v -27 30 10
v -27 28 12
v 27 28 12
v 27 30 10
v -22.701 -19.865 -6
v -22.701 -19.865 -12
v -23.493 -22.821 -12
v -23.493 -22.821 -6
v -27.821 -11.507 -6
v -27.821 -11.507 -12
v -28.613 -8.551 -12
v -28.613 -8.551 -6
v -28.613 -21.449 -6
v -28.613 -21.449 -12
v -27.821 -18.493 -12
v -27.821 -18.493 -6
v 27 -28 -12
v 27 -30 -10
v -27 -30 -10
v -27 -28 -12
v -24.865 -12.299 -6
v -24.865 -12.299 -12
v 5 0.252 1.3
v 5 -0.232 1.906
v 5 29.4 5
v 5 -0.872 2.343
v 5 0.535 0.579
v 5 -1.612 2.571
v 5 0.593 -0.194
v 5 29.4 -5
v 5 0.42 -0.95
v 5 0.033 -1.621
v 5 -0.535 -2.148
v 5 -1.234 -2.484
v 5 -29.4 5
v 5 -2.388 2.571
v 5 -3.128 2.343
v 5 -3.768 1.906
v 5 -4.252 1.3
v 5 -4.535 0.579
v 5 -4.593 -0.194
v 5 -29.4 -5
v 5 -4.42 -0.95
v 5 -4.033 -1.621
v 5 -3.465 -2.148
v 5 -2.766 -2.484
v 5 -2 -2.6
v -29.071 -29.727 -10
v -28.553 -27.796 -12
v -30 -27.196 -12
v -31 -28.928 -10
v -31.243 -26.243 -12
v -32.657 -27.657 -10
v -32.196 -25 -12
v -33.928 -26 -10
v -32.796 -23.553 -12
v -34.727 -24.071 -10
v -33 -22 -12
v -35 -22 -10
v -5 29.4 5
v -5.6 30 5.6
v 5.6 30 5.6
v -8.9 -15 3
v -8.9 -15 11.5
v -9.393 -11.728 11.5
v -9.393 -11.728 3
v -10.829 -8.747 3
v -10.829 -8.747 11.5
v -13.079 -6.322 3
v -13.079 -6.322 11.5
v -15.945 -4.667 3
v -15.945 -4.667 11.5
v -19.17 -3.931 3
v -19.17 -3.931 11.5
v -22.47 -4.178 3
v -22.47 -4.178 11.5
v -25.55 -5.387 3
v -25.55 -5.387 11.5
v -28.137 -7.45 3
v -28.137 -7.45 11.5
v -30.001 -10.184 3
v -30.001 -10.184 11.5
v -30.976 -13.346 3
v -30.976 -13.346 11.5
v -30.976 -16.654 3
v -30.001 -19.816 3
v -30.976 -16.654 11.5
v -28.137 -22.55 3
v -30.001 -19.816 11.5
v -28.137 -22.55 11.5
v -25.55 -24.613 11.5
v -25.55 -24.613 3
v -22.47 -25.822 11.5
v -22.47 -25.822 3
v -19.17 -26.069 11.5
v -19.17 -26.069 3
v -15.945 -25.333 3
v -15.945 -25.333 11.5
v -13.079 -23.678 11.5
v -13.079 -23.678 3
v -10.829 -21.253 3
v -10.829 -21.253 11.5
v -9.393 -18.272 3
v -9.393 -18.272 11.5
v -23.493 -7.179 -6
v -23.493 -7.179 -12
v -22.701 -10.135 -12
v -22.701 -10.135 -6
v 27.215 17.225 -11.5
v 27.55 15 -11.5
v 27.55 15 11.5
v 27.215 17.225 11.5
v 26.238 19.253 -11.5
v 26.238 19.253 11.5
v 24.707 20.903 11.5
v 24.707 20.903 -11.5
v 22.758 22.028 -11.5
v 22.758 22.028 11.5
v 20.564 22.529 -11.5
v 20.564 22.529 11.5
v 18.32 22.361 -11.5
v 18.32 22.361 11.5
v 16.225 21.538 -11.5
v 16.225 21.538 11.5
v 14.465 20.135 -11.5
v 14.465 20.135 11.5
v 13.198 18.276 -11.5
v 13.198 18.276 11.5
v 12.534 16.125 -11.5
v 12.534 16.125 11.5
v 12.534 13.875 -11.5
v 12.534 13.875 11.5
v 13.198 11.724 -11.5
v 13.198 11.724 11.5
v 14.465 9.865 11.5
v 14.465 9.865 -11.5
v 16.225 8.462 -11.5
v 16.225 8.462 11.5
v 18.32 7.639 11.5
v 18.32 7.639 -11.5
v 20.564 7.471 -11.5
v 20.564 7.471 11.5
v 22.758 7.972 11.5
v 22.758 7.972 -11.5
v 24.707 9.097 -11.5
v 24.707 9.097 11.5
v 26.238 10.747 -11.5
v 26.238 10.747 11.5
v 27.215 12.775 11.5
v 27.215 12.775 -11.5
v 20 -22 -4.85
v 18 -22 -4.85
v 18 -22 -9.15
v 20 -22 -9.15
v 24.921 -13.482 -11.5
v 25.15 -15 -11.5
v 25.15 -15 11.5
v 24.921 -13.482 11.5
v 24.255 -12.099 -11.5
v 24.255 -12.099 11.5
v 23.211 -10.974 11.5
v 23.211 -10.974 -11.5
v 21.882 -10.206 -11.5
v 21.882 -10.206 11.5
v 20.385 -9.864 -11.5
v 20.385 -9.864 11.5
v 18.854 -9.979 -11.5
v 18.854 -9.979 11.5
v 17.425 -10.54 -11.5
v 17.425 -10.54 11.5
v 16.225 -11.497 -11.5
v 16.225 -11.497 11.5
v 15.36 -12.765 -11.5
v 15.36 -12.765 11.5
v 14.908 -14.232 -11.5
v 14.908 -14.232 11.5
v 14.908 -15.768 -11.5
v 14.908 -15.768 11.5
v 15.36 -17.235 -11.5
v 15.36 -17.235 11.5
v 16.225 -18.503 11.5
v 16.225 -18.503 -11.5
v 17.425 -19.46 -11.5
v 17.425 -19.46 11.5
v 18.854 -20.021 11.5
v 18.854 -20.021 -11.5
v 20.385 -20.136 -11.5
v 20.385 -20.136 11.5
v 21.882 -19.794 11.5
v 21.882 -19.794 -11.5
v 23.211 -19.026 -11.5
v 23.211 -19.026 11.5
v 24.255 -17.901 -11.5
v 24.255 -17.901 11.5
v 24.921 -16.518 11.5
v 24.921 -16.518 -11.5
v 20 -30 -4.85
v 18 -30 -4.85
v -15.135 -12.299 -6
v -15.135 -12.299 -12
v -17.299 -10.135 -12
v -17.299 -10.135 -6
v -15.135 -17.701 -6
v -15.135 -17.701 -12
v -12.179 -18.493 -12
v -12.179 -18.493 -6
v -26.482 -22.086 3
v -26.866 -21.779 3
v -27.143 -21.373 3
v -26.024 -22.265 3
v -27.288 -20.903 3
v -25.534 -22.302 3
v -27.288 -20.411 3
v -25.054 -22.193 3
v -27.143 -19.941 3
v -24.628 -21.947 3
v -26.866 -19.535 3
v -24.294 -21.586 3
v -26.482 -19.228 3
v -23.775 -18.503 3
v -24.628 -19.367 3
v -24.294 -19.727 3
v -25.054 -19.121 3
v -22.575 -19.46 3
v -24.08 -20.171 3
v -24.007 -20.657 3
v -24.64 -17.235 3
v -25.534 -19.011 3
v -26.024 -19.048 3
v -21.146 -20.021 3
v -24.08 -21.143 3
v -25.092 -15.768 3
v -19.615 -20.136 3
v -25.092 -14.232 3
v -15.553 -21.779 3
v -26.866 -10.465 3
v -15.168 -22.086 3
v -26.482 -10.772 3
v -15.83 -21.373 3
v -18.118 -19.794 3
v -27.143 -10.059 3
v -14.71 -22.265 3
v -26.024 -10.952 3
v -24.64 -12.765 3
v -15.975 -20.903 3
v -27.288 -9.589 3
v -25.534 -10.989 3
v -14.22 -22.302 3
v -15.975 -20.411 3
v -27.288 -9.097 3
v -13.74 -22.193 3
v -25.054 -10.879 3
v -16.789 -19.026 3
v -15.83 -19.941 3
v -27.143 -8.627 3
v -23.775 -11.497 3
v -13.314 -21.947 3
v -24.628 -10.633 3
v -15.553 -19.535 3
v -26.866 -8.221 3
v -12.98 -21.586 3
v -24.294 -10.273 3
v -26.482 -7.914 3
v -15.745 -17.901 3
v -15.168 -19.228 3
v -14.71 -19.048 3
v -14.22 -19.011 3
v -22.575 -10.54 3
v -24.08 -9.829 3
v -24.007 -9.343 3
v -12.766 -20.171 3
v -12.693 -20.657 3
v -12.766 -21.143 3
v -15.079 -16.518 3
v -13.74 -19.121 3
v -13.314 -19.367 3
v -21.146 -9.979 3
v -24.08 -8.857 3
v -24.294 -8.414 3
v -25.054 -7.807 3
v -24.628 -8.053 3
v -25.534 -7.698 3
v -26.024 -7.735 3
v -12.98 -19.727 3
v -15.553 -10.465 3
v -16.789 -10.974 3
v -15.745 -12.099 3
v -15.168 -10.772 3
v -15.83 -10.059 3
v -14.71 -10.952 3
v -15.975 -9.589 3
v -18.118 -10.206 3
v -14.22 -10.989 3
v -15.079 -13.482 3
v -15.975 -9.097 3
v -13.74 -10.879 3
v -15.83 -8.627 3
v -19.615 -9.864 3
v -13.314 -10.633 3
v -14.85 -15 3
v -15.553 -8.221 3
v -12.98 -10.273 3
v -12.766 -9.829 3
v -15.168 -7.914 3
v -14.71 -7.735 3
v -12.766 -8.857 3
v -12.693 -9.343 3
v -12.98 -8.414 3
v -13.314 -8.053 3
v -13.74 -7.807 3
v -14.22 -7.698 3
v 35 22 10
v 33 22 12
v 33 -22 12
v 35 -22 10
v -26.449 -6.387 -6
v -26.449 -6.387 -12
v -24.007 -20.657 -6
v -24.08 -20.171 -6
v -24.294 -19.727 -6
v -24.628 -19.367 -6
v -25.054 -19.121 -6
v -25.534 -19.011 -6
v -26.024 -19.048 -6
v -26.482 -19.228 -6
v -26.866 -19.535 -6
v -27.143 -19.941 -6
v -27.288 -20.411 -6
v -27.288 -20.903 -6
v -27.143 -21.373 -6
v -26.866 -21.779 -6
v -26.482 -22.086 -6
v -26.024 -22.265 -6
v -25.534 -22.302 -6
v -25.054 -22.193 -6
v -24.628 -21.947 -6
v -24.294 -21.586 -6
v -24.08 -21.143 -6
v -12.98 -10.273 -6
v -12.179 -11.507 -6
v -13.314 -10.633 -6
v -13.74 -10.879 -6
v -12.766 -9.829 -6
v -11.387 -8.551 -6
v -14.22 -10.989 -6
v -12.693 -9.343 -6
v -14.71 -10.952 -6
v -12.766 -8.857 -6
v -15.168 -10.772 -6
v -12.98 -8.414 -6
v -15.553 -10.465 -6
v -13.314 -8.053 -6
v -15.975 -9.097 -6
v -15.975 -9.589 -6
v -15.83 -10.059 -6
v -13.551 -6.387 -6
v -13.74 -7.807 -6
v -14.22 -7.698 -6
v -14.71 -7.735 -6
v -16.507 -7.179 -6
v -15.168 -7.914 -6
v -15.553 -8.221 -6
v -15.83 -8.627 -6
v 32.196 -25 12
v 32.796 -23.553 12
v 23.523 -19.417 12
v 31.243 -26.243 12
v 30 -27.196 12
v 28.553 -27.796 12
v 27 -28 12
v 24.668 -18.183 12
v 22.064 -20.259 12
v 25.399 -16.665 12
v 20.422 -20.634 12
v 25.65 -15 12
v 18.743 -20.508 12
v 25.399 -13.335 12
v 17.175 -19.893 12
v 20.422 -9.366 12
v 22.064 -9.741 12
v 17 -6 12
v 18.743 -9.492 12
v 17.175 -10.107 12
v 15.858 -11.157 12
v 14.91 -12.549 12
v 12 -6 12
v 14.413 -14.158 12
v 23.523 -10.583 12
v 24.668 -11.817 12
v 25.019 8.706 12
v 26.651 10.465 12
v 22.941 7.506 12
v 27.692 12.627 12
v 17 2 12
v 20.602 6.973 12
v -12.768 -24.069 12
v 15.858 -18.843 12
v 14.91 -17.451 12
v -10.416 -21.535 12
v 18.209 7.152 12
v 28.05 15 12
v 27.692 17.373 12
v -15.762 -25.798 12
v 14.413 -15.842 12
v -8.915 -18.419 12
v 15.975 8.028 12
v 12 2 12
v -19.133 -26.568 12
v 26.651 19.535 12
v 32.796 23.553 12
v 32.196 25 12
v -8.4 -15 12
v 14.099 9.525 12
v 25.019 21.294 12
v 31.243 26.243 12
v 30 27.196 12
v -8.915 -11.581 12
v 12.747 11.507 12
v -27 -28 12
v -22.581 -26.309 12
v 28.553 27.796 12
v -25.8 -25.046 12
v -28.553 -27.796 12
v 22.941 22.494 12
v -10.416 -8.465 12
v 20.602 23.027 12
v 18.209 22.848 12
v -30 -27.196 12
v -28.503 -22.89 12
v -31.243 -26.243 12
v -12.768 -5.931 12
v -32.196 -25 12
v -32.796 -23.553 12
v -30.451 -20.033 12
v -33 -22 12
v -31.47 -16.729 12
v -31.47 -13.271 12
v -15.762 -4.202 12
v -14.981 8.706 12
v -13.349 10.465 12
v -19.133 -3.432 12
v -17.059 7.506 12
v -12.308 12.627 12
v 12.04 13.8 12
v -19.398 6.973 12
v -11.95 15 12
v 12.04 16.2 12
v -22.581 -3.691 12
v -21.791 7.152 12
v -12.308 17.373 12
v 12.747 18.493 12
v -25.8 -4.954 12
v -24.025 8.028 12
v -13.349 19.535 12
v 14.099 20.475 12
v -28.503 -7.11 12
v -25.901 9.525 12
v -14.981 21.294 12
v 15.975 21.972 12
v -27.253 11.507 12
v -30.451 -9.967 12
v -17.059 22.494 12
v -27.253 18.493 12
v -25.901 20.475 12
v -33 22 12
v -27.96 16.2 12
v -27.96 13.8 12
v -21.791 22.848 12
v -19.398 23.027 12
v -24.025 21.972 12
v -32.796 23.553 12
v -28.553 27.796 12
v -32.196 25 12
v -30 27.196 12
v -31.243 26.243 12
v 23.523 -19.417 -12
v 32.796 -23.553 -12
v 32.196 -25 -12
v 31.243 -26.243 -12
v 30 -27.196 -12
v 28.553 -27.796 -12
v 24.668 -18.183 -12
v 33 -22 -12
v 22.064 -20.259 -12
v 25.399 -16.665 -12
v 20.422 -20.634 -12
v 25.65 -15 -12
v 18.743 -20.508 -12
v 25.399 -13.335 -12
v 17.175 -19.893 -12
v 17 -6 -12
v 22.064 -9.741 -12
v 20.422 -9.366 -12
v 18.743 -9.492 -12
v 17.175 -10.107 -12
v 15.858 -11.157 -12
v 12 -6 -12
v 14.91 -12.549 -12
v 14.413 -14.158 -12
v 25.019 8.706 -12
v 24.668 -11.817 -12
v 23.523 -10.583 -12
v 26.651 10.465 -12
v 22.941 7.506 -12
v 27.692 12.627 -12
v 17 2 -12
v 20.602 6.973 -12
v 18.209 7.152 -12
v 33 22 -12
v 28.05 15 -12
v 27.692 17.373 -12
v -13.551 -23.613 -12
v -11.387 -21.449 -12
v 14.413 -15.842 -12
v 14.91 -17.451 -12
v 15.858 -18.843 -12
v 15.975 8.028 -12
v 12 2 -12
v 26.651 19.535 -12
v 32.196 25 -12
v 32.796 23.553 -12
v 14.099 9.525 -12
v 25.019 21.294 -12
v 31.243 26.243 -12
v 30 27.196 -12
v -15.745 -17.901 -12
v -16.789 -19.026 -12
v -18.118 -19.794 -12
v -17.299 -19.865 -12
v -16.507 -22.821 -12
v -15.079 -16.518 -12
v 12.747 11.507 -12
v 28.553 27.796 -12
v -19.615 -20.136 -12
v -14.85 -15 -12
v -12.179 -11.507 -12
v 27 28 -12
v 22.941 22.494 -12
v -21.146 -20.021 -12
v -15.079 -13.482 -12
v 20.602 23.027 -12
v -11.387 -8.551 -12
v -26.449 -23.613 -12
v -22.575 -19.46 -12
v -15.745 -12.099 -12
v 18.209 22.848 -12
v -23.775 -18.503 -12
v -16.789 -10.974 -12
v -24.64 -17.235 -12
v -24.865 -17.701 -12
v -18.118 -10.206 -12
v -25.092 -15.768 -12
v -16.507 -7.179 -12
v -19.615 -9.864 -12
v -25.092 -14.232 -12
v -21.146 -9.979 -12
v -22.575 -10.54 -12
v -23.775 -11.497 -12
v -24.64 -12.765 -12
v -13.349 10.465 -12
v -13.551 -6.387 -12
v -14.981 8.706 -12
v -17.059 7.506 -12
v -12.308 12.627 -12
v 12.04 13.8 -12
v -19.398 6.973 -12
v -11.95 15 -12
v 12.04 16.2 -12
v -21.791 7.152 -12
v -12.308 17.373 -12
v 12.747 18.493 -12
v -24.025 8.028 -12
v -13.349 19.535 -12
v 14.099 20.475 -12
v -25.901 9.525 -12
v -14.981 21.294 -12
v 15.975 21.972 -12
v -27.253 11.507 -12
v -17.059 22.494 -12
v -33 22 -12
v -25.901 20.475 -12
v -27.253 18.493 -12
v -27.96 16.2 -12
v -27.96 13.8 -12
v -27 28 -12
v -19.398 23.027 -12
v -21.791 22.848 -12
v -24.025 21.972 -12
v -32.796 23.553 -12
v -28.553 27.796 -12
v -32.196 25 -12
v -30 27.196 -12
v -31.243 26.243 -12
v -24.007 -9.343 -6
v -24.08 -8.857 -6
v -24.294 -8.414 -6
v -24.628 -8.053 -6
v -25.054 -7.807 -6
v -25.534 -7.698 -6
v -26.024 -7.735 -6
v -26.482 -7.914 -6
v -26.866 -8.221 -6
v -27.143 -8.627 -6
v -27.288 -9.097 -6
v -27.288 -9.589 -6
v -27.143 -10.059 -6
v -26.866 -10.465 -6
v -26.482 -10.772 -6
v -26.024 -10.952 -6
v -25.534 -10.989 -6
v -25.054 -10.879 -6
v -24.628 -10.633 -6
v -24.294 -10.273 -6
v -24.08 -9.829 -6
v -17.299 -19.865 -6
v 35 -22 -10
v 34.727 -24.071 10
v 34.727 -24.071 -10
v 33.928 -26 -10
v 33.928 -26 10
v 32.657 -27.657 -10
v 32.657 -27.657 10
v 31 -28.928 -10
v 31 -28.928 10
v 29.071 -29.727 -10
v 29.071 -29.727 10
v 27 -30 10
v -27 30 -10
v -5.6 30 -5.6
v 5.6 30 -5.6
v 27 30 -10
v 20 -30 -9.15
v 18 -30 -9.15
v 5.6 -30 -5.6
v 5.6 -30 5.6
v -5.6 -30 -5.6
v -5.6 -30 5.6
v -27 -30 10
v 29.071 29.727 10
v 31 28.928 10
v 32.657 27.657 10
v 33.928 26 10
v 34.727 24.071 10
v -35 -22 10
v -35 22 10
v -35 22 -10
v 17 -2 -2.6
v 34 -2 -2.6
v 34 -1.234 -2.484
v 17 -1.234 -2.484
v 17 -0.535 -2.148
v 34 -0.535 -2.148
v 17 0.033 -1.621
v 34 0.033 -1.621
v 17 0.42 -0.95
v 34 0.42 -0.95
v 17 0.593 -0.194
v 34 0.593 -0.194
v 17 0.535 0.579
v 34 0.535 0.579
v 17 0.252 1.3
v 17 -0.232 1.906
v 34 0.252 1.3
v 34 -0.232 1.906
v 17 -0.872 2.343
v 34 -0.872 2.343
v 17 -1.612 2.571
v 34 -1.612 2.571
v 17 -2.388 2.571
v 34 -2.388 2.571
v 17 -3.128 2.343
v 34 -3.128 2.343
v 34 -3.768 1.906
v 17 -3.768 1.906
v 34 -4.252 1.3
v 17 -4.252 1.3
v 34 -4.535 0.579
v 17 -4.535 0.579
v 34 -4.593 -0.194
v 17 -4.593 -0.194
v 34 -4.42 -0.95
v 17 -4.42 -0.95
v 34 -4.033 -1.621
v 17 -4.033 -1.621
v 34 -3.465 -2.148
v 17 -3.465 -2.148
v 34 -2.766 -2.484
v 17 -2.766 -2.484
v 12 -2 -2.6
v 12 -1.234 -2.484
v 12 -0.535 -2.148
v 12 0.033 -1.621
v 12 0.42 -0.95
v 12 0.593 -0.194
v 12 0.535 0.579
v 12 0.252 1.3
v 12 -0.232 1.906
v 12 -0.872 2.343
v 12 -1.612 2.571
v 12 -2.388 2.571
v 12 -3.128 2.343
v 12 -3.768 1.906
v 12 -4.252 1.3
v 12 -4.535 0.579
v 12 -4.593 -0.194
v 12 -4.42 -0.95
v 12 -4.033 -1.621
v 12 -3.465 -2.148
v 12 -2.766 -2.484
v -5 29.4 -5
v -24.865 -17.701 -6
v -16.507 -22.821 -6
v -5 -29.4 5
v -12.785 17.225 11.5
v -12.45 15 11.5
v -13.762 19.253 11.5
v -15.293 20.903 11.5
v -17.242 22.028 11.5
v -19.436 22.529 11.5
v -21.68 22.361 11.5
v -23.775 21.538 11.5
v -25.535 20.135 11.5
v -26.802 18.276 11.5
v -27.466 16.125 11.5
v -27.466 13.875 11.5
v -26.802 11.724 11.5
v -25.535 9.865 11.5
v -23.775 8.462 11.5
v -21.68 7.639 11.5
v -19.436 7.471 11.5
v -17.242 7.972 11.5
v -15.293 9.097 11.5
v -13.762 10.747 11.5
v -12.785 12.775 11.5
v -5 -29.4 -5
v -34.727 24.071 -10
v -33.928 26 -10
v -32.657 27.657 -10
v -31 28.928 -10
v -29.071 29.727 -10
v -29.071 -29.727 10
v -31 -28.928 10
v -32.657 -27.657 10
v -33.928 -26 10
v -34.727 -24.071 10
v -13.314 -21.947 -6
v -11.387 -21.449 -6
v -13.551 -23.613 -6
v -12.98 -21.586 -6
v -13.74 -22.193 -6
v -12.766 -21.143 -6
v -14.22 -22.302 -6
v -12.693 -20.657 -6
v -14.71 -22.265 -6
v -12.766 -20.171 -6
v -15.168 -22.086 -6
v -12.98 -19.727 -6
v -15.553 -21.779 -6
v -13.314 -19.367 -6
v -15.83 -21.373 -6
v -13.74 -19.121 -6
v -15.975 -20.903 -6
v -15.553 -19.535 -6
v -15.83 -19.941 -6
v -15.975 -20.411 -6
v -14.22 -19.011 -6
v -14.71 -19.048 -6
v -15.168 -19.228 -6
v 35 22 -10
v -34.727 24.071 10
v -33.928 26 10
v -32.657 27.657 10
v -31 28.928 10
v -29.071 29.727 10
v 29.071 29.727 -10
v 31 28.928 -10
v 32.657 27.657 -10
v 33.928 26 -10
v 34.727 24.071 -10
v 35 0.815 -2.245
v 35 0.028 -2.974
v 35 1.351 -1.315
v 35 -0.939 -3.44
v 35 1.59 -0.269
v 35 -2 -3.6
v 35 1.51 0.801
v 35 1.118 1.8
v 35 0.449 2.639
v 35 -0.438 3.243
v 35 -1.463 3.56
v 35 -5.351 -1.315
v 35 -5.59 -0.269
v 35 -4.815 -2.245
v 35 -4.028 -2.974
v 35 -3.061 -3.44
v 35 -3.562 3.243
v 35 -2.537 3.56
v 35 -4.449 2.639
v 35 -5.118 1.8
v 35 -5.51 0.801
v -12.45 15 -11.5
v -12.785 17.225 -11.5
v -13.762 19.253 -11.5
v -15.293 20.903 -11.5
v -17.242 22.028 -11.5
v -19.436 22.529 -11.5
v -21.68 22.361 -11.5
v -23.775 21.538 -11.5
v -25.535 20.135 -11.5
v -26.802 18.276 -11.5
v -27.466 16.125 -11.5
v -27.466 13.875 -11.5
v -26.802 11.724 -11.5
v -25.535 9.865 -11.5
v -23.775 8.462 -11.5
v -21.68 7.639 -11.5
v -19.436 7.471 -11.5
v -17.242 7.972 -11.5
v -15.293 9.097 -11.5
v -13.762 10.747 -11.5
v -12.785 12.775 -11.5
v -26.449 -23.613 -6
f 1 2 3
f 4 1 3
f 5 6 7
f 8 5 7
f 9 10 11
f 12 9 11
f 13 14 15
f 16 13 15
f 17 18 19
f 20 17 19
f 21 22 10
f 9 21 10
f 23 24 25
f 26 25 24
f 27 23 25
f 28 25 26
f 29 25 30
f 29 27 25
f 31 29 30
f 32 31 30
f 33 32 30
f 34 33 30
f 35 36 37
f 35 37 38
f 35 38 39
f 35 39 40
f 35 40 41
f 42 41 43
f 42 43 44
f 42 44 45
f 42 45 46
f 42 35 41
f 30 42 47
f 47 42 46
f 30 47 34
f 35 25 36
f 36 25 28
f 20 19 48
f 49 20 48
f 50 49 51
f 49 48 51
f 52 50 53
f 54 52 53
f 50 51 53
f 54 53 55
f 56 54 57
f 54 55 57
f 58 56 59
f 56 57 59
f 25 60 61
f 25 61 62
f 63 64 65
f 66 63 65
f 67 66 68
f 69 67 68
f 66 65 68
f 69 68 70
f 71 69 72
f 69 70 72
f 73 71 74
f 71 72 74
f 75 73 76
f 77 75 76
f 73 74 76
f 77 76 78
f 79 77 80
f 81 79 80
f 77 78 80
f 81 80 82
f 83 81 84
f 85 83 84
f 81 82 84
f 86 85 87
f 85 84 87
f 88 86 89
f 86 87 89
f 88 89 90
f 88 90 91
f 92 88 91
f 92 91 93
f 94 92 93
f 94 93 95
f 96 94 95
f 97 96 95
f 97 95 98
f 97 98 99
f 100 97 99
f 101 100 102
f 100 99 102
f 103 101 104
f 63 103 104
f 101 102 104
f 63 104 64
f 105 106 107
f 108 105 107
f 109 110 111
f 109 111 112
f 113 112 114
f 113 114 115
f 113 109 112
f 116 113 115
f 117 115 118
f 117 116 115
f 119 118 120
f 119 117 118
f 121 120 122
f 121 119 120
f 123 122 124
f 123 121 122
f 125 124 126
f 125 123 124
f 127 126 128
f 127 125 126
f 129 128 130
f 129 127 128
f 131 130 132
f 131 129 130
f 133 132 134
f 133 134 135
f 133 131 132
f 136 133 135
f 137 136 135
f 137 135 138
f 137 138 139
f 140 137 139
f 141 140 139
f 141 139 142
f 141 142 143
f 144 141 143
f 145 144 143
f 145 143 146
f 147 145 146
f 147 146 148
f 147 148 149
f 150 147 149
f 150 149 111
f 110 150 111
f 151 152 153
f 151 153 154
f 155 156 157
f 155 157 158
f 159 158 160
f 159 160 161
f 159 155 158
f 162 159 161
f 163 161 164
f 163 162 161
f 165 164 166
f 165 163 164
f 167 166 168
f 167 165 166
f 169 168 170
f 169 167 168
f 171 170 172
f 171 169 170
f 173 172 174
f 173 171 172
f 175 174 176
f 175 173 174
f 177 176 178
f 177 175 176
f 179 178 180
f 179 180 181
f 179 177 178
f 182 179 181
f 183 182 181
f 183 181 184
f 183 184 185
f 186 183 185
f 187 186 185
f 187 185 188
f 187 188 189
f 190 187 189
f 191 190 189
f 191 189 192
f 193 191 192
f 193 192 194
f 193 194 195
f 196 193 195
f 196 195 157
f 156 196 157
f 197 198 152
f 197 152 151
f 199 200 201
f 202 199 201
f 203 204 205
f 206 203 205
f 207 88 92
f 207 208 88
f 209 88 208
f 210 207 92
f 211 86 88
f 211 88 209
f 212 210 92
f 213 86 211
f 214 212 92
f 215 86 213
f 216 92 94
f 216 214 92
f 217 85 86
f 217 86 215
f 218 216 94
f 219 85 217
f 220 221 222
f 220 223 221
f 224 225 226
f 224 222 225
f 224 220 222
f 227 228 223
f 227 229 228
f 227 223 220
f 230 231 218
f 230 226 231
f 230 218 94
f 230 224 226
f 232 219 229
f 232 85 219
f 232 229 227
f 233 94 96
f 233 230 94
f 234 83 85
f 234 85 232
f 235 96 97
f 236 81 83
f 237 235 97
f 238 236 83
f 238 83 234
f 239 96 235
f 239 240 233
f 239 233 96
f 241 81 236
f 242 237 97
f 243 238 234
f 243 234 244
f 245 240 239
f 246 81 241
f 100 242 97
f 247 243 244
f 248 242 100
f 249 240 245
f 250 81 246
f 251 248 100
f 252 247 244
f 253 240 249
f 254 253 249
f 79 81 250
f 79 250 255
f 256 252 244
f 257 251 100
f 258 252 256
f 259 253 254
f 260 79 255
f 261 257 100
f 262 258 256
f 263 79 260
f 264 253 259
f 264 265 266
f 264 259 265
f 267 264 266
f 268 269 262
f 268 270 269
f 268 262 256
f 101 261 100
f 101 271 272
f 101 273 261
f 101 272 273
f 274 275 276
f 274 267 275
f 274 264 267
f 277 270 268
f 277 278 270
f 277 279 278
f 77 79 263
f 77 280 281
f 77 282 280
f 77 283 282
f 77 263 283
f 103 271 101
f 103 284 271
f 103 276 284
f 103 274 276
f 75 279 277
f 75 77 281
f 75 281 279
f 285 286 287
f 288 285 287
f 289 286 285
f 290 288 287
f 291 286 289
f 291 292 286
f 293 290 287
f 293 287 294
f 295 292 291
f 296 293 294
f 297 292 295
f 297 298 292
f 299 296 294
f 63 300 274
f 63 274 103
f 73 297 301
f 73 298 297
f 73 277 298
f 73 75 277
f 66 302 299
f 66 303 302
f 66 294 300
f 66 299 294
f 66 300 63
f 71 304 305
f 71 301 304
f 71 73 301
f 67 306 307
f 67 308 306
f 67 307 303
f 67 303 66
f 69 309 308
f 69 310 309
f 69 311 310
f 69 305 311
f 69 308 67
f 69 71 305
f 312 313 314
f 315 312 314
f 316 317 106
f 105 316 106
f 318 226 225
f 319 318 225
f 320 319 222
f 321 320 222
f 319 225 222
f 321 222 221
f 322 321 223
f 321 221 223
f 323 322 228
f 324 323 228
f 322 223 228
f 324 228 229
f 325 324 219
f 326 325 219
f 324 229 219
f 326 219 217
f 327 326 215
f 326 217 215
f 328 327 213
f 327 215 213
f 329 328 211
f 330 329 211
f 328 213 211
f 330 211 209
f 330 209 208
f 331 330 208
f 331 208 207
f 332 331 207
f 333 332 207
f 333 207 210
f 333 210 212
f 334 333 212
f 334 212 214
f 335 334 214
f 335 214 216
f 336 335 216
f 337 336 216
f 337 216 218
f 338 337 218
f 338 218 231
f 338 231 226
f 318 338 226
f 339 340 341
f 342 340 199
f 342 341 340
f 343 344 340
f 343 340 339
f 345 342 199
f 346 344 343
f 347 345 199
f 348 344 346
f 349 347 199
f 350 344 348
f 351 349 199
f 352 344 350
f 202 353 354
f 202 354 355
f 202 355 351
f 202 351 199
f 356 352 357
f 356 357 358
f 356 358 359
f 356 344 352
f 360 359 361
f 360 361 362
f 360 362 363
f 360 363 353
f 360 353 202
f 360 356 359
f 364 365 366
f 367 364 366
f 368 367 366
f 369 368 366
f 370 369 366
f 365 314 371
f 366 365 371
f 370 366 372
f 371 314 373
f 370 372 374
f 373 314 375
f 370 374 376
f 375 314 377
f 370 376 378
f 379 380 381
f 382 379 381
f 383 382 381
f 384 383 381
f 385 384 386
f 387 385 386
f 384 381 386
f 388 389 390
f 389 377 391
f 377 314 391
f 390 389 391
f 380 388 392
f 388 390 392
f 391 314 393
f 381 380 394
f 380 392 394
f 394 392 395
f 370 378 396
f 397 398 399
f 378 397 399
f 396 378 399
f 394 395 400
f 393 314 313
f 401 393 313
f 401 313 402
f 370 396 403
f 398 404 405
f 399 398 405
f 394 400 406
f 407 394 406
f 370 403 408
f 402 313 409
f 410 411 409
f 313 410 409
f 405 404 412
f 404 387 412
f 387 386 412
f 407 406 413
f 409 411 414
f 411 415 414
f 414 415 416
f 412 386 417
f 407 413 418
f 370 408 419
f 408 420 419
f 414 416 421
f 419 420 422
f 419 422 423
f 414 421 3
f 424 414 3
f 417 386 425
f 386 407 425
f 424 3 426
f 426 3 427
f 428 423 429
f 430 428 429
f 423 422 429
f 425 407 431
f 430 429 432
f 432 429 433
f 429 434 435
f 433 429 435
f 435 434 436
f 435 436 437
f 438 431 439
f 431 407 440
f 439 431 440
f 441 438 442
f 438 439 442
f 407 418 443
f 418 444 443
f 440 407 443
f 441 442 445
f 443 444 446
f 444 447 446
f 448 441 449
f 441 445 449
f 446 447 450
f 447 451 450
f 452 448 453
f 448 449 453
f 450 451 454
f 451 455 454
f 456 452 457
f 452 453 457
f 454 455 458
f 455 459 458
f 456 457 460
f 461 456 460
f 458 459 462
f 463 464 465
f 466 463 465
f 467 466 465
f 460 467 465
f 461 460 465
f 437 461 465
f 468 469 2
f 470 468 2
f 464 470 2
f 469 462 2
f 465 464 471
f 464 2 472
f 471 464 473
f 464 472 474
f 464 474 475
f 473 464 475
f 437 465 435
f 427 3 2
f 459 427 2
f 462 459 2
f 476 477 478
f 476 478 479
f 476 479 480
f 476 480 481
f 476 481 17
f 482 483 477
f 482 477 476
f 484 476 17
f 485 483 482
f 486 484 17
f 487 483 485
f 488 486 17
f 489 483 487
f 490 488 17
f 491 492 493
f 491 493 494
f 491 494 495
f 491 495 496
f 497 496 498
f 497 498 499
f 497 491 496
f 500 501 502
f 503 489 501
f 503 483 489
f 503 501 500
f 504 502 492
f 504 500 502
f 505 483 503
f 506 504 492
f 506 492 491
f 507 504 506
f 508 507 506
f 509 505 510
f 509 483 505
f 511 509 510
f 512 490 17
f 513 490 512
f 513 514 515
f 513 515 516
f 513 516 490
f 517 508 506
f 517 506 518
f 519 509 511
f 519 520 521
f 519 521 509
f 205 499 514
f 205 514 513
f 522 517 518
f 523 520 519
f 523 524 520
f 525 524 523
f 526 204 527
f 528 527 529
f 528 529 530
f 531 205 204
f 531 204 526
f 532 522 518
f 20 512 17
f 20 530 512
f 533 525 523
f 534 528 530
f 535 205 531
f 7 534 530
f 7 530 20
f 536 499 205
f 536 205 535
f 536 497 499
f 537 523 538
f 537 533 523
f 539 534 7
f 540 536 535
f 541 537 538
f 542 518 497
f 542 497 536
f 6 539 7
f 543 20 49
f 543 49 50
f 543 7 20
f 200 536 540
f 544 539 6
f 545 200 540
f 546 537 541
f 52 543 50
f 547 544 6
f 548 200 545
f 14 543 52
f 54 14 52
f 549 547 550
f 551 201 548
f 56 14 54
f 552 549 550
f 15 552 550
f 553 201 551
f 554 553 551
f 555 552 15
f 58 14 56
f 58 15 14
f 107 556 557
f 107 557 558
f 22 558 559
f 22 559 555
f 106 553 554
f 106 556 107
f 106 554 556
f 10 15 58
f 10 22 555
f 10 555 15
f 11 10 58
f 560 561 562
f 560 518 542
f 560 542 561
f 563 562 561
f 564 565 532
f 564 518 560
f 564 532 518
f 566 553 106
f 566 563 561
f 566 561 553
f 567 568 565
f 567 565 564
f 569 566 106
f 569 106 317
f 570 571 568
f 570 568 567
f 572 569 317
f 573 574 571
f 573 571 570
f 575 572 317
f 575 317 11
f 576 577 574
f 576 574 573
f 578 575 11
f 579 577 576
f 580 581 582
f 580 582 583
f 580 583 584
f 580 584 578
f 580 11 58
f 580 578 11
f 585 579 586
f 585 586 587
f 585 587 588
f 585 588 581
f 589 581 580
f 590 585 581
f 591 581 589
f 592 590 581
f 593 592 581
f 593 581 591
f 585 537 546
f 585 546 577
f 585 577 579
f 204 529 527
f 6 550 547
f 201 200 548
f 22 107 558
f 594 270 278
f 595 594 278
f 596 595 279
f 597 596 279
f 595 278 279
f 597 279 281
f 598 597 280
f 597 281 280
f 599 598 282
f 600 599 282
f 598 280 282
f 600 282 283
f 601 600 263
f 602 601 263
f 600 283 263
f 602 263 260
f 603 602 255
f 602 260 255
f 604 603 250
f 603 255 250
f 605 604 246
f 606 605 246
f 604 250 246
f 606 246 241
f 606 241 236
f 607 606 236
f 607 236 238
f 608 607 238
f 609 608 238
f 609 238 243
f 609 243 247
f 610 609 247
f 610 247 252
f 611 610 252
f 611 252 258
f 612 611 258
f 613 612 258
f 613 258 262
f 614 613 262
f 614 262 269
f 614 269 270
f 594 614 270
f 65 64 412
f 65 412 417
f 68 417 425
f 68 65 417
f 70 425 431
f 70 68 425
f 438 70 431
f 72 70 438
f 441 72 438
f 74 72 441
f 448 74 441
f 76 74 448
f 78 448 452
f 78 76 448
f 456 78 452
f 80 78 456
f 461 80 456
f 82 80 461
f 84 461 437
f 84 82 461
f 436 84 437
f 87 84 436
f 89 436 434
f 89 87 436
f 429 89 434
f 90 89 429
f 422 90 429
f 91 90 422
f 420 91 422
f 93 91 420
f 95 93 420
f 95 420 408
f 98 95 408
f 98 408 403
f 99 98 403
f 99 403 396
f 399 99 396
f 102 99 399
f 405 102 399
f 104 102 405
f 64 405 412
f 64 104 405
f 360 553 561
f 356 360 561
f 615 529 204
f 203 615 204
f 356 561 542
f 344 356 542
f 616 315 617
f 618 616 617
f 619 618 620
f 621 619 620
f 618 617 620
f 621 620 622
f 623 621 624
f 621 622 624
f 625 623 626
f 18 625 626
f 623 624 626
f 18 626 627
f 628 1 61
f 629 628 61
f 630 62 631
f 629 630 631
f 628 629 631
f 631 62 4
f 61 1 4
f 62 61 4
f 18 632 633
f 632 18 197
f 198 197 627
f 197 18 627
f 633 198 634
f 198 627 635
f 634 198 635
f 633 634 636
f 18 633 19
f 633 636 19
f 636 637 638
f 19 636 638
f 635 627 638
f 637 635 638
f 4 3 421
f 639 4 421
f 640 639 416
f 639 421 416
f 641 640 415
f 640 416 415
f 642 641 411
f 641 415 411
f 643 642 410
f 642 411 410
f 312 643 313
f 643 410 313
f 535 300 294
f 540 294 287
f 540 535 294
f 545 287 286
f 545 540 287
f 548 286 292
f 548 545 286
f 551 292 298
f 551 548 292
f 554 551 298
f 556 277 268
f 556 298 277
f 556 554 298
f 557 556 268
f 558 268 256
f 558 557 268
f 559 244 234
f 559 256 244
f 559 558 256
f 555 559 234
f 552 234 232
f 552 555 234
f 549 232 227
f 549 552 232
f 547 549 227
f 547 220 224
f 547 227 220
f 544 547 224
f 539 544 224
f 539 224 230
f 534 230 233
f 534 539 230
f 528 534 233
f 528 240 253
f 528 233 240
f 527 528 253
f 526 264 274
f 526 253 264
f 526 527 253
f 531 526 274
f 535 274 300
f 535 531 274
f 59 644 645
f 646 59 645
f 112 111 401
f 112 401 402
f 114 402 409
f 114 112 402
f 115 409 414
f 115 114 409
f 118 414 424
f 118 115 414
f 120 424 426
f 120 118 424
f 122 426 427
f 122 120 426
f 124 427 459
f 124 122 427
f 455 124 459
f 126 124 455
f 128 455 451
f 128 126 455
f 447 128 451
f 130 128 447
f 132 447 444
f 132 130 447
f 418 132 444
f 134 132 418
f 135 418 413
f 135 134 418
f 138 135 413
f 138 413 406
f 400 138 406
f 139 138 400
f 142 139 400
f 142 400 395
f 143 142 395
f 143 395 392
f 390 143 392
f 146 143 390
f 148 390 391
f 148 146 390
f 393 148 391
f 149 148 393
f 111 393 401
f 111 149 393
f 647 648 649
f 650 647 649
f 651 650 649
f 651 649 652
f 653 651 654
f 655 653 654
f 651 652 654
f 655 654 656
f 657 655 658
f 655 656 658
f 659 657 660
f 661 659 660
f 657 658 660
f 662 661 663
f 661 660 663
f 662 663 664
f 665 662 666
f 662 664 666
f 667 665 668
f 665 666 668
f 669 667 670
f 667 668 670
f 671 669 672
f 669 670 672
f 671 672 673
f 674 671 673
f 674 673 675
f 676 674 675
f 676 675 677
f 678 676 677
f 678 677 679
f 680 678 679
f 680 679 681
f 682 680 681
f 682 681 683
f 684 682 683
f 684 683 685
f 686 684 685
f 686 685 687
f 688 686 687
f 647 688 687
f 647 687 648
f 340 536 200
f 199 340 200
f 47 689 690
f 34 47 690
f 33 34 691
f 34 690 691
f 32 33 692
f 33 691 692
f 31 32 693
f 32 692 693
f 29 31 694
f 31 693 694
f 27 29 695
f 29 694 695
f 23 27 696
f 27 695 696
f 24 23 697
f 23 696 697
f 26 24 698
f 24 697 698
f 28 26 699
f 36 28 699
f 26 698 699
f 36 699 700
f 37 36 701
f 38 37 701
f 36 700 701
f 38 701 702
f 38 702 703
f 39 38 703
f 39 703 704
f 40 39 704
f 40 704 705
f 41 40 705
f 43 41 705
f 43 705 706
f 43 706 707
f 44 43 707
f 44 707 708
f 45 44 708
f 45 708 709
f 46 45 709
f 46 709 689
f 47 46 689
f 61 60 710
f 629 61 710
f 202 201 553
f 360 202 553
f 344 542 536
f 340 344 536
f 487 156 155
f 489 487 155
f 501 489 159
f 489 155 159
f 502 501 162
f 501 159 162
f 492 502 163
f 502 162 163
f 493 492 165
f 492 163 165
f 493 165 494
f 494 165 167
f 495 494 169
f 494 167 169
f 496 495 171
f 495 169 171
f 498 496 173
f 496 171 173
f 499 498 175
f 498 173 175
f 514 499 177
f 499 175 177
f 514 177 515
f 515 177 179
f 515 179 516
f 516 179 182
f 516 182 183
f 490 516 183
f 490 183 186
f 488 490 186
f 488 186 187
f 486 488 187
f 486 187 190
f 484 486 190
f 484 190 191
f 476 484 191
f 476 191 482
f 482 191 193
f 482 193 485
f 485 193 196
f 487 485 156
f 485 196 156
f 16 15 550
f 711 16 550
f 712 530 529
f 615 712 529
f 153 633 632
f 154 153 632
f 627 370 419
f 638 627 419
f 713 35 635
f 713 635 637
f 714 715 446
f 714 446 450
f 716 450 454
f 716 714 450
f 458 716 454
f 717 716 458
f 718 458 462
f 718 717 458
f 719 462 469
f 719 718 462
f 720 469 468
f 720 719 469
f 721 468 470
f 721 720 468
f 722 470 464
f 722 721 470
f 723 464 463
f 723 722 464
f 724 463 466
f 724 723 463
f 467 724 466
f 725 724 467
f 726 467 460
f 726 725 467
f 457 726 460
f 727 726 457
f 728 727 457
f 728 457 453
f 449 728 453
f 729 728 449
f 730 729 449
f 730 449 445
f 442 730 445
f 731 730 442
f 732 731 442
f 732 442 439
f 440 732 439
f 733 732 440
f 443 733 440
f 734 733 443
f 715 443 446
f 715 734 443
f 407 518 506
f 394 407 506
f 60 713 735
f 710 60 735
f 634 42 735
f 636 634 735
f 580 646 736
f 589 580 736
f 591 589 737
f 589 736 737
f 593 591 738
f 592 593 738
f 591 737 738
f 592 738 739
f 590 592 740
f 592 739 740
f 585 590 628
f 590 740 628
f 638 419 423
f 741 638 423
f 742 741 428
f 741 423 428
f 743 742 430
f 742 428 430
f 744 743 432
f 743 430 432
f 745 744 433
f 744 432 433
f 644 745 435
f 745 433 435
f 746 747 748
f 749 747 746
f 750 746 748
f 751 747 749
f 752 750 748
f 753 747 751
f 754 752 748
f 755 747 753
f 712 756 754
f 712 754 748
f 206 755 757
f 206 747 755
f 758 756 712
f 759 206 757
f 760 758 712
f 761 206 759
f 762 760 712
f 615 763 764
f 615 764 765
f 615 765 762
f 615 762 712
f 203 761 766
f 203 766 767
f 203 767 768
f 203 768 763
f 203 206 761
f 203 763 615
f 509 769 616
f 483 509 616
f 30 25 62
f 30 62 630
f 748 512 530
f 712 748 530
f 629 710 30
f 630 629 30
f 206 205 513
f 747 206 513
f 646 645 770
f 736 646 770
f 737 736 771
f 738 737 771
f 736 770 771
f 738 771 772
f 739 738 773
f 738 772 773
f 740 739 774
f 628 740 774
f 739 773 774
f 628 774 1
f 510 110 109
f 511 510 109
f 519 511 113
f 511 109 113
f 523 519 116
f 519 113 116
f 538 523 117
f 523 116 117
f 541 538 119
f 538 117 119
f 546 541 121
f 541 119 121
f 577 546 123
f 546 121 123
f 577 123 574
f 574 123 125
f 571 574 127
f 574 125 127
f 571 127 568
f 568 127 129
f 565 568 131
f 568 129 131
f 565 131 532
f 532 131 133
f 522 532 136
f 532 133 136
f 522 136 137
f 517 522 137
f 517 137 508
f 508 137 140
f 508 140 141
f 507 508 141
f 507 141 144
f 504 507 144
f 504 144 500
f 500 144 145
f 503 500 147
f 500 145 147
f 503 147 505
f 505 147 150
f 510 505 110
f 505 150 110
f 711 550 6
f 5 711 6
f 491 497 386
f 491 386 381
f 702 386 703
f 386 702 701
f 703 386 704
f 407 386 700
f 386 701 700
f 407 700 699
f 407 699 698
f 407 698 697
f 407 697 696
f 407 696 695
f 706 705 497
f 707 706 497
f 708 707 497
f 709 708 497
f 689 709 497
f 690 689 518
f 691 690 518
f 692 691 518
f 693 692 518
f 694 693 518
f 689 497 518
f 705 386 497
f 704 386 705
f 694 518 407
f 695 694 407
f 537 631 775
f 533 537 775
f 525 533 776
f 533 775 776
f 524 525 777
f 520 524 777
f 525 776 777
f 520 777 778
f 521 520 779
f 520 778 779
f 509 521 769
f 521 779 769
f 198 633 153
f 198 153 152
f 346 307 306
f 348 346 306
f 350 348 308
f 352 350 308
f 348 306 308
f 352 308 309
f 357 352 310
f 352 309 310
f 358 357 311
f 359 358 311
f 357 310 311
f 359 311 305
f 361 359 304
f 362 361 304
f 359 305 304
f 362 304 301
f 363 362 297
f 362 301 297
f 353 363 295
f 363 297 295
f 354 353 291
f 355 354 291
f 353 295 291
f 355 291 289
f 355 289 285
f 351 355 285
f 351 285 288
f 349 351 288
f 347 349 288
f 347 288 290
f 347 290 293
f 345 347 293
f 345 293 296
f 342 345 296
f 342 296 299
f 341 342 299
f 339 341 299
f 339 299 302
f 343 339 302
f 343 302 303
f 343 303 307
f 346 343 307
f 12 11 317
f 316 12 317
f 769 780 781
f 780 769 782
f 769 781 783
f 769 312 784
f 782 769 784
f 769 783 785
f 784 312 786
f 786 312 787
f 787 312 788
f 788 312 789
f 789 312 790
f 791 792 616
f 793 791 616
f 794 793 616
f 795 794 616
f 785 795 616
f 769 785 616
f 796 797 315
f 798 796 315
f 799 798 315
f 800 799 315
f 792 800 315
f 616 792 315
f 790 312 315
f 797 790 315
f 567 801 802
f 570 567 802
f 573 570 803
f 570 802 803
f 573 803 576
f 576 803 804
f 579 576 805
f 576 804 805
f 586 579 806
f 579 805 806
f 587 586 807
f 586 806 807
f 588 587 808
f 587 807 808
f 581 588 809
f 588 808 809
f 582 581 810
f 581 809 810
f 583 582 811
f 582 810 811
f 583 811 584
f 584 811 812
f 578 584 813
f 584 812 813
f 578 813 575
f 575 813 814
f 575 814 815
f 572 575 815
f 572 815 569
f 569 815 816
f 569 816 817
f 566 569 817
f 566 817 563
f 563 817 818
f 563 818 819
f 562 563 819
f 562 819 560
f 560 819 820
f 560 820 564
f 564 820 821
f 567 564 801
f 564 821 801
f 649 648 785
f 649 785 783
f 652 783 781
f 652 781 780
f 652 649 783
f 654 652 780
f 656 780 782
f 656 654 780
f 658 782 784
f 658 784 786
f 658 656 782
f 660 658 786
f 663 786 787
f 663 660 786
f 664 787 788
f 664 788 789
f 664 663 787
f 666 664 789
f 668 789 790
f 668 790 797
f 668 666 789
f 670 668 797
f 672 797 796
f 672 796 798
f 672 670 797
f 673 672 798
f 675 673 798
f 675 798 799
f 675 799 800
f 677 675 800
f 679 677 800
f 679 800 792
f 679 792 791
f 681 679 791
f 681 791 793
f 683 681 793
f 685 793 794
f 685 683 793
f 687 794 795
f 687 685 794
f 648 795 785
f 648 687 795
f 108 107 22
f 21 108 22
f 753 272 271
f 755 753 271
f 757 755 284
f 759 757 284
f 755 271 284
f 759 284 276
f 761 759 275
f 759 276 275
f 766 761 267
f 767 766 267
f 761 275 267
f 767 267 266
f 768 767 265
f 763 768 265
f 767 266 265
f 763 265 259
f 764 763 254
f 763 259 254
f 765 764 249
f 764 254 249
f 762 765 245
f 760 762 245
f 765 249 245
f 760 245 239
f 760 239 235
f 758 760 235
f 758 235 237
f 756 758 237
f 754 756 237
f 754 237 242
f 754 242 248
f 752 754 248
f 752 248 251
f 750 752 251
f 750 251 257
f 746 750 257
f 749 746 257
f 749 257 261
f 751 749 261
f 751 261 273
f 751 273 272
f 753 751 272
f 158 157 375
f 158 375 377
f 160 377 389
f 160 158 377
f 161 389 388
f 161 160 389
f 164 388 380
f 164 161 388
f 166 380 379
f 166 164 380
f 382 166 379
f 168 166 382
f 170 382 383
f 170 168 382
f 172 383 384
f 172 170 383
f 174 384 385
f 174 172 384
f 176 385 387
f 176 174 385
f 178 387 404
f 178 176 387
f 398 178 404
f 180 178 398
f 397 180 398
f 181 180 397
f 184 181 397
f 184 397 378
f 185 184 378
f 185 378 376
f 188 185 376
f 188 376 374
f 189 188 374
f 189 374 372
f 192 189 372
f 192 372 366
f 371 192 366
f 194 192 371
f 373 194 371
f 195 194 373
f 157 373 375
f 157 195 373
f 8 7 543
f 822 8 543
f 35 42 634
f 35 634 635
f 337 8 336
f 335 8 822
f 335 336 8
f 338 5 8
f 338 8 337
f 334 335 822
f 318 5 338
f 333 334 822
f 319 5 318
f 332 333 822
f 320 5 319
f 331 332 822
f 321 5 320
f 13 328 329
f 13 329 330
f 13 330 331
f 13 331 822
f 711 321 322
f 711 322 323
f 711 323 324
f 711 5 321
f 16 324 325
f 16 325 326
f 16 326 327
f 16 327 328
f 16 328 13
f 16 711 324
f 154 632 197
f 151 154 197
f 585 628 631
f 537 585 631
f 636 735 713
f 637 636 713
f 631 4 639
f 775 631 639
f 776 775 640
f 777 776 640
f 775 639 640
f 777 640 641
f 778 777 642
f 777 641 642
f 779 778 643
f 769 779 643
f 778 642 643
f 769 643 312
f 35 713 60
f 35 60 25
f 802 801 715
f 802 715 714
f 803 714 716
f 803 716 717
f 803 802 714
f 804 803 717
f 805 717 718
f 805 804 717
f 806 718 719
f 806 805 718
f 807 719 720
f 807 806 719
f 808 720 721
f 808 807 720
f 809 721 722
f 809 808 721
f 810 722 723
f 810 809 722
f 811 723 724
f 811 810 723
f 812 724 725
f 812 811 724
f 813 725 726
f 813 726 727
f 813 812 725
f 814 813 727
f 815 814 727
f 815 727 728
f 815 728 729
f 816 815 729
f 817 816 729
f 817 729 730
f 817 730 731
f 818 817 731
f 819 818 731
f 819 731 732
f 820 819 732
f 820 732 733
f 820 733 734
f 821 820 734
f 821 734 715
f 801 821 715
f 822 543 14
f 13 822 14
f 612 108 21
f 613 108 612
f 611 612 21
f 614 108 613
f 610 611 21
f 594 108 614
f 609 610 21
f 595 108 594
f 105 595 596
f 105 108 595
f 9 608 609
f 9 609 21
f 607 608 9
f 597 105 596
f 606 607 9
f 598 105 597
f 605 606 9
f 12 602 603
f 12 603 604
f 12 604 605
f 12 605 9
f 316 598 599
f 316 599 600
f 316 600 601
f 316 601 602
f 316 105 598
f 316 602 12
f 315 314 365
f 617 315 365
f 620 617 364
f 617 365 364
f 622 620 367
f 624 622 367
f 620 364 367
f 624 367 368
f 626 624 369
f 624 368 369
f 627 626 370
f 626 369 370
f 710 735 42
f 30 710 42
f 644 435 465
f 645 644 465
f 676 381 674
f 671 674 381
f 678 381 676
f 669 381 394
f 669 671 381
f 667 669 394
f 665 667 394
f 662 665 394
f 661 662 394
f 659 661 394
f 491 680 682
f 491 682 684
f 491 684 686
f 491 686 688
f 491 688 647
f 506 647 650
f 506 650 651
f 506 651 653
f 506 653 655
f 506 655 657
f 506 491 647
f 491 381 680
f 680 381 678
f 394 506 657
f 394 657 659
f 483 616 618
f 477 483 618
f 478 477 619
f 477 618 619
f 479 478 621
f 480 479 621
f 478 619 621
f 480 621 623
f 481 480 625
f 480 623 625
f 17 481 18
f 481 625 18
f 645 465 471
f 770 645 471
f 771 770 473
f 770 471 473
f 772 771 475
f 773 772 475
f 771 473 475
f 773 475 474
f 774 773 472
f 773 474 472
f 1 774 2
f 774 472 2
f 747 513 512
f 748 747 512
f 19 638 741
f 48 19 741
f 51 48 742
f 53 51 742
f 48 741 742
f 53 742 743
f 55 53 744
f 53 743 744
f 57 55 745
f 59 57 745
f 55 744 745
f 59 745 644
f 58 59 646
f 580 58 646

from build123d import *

# Parameters (mm, degrees)
SKETCH1_R               = 7.55
SKETCH1_R_2             = 5.15
BOSS_EXTRUDE1_DEPTH     = 12
SKETCH2_R               = 11.1
CUT_EXTRUDE1_DEPTH      = 9
SKETCH3_R               = 1.65
CUT_EXTRUDE2_DEPTH      = 52.971145841
CUT_EXTRUDE3_DEPTH      = 6
CUT_EXTRUDE4_DEPTH      = 48.634021455
CUT_EXTRUDE4_DEPTH_BACK = 48.634021455
SKETCH5_W               = 10
SKETCH5_H               = 10
CHAMFER1_SIZE           = 2
CHAMFER2_SIZE           = 0.5
SKETCH7_R               = 2.6
CUT_EXTRUDE6_DEPTH      = 33
CUT_EXTRUDE7_DEPTH      = 48.634021455
CUT_EXTRUDE7_DEPTH_BACK = 48.634021455
SKETCH8_W               = 5
SKETCH8_H               = 8
CHAMFER3_SIZE           = 1
CHAMFER4_SIZE           = 0.6
SKETCH9_W               = 2
SKETCH9_H               = 4.3
CUT_EXTRUDE8_DEPTH      = 8


with BuildPart() as part:
    # Sketch1 → Boss-Extrude1 (new, symmetric)
    with BuildSketch(Plane.XY):
        with BuildLine():
            Line((27, -30), (-27, -30))
            ThreePointArc((-27, -30), (-32.656854249, -27.656854249), (-35, -22))
            Line((-35, -22), (-35, 22))
            ThreePointArc((-35, 22), (-32.656854249, 27.656854249), (-27, 30))
            Line((-27, 30), (27, 30))
            ThreePointArc((27, 30), (32.656854249, 27.656854249), (35, 22))
            Line((35, 22), (35, -22))
            ThreePointArc((35, -22), (32.656854249, -27.656854249), (27, -30))
        make_face()
        with Locations((-20, 15)):
            Circle(SKETCH1_R, mode=Mode.SUBTRACT)
        with Locations((20, 15)):
            Circle(SKETCH1_R, mode=Mode.SUBTRACT)
        with Locations((20, -15)):
            Circle(SKETCH1_R_2, mode=Mode.SUBTRACT)
        with Locations((-20, -15)):
            Circle(SKETCH1_R_2, mode=Mode.SUBTRACT)
    extrude(amount=BOSS_EXTRUDE1_DEPTH, both=True)

    # Sketch2 → Cut-Extrude1 (cut)
    with BuildSketch(Plane.XY.offset(12)):
        with Locations((-20, -15)):
            Circle(SKETCH2_R)
    extrude(amount=-CUT_EXTRUDE1_DEPTH, mode=Mode.SUBTRACT)

    # Sketch3 → Cut-Extrude2 (cut, through all)
    with BuildSketch(Plane.XY.offset(12)):
        with Locations((-25.656854249, -9.343145751)):
            Circle(SKETCH3_R)
        with Locations((-14.343145751, -9.343145751)):
            Circle(SKETCH3_R)
        with Locations((-14.343145751, -20.656854249)):
            Circle(SKETCH3_R)
        with Locations((-25.656854249, -20.656854249)):
            Circle(SKETCH3_R)
    extrude(amount=-CUT_EXTRUDE2_DEPTH, mode=Mode.SUBTRACT)

    # Sketch4 → Cut-Extrude3 (cut)
    with BuildSketch(Plane(origin=(0, 0, -12), x_dir=(-1, 0, 0), z_dir=(0, 0, -1))):
        Polygon((17.29883669, -10.135120751), (16.50686169, -7.179429811), (13.55117075, -6.387454811), (11.387454811, -8.55117075), (12.179429811, -11.50686169), (15.135120751, -12.29883669), align=None)
        Polygon((23.49313831, -7.179429811), (22.70116331, -10.135120751), (24.864879249, -12.29883669), (27.820570189, -11.50686169), (28.612545189, -8.55117075), (26.44882925, -6.387454811), align=None)
        Polygon((24.864879249, -17.70116331), (22.70116331, -19.864879249), (23.49313831, -22.820570189), (26.44882925, -23.612545189), (28.612545189, -21.44882925), (27.820570189, -18.49313831), align=None)
        Polygon((15.135120751, -17.70116331), (12.179429811, -18.49313831), (11.387454811, -21.44882925), (13.55117075, -23.612545189), (16.50686169, -22.820570189), (17.29883669, -19.864879249), align=None)
    extrude(amount=-CUT_EXTRUDE3_DEPTH, mode=Mode.SUBTRACT)

    # Sketch5 → Cut-Extrude4 (cut, two sides: drawn at the far end of the back side and taken through both)
    with BuildSketch(Plane(origin=(0, 0, 0), x_dir=(1, 0, 0), z_dir=(0, 1, 0)).offset(-CUT_EXTRUDE4_DEPTH_BACK)):
        Rectangle(SKETCH5_W, SKETCH5_H)
    extrude(amount=CUT_EXTRUDE4_DEPTH + CUT_EXTRUDE4_DEPTH_BACK, mode=Mode.SUBTRACT)

    # Chamfer1
    chamfer1_edges = [part.edges().sort_by_distance(p)[0] for p in [
        (35, 0, -12),
        (32.656854249, -27.656854249, -12),
        (0, -30, -12),
        (-32.656854249, -27.656854249, -12),
        (32.656854249, -27.656854249, 12),
        (35, 0, 12),
        (32.656854249, 27.656854249, 12),
        (0, 30, 12),
        (-32.656854249, 27.656854249, 12),
        (-35, 0, 12),
        (-32.656854249, -27.656854249, 12),
        (-35, 0, -12),
        (0, -30, 12),
        (-32.656854249, 27.656854249, -12),
        (0, 30, -12),
        (32.656854249, 27.656854249, -12),
    ]]
    chamfer(chamfer1_edges, length=CHAMFER1_SIZE)

    # Chamfer2
    chamfer2_edges = [part.edges().sort_by_distance(p)[0] for p in [
        (-27.55, 15, -12),
        (-27.55, 15, 12),
        (12.45, 15, -12),
        (12.45, 15, 12),
        (14.85, -15, -12),
        (14.85, -15, 12),
        (-31.1, -15, 12),
    ]]
    chamfer(chamfer2_edges, length=CHAMFER2_SIZE)

    # Sketch7 → Cut-Extrude6 (cut)
    with BuildSketch(Plane(origin=(35, 0, 0), x_dir=(0, 0, -1), z_dir=(1, 0, 0))):
        with Locations((0, -2)):
            Circle(SKETCH7_R)
    extrude(amount=-CUT_EXTRUDE6_DEPTH, mode=Mode.SUBTRACT)

    # Sketch8 → Cut-Extrude7 (cut, two sides: drawn at the far end of the back side and taken through both)
    with BuildSketch(Plane.XY.offset(-CUT_EXTRUDE7_DEPTH_BACK)):
        with Locations((14.5, -2)):
            Rectangle(SKETCH8_W, SKETCH8_H)
    extrude(amount=CUT_EXTRUDE7_DEPTH + CUT_EXTRUDE7_DEPTH_BACK, mode=Mode.SUBTRACT)

    # Chamfer3
    chamfer3_edges = [part.edges().sort_by_distance(p)[0] for p in [
        (35, -2, 2.6),
    ]]
    chamfer(chamfer3_edges, length=CHAMFER3_SIZE)

    # Chamfer4
    chamfer4_edges = [part.edges().sort_by_distance(p)[0] for p in [
        (-5, -30, 0),
        (0, -30, -5),
        (5, -30, 0),
        (0, -30, 5),
        (-5, 30, 0),
        (0, 30, 5),
        (5, 30, 0),
        (0, 30, -5),
    ]]
    chamfer(chamfer4_edges, length=CHAMFER4_SIZE)

    # Sketch9 → Cut-Extrude8 (cut)
    with BuildSketch(Plane.XZ.offset(30)):
        with Locations((19, -7)):
            Rectangle(SKETCH9_W, SKETCH9_H)
    extrude(amount=-CUT_EXTRUDE8_DEPTH, mode=Mode.SUBTRACT)


solid = part.part
